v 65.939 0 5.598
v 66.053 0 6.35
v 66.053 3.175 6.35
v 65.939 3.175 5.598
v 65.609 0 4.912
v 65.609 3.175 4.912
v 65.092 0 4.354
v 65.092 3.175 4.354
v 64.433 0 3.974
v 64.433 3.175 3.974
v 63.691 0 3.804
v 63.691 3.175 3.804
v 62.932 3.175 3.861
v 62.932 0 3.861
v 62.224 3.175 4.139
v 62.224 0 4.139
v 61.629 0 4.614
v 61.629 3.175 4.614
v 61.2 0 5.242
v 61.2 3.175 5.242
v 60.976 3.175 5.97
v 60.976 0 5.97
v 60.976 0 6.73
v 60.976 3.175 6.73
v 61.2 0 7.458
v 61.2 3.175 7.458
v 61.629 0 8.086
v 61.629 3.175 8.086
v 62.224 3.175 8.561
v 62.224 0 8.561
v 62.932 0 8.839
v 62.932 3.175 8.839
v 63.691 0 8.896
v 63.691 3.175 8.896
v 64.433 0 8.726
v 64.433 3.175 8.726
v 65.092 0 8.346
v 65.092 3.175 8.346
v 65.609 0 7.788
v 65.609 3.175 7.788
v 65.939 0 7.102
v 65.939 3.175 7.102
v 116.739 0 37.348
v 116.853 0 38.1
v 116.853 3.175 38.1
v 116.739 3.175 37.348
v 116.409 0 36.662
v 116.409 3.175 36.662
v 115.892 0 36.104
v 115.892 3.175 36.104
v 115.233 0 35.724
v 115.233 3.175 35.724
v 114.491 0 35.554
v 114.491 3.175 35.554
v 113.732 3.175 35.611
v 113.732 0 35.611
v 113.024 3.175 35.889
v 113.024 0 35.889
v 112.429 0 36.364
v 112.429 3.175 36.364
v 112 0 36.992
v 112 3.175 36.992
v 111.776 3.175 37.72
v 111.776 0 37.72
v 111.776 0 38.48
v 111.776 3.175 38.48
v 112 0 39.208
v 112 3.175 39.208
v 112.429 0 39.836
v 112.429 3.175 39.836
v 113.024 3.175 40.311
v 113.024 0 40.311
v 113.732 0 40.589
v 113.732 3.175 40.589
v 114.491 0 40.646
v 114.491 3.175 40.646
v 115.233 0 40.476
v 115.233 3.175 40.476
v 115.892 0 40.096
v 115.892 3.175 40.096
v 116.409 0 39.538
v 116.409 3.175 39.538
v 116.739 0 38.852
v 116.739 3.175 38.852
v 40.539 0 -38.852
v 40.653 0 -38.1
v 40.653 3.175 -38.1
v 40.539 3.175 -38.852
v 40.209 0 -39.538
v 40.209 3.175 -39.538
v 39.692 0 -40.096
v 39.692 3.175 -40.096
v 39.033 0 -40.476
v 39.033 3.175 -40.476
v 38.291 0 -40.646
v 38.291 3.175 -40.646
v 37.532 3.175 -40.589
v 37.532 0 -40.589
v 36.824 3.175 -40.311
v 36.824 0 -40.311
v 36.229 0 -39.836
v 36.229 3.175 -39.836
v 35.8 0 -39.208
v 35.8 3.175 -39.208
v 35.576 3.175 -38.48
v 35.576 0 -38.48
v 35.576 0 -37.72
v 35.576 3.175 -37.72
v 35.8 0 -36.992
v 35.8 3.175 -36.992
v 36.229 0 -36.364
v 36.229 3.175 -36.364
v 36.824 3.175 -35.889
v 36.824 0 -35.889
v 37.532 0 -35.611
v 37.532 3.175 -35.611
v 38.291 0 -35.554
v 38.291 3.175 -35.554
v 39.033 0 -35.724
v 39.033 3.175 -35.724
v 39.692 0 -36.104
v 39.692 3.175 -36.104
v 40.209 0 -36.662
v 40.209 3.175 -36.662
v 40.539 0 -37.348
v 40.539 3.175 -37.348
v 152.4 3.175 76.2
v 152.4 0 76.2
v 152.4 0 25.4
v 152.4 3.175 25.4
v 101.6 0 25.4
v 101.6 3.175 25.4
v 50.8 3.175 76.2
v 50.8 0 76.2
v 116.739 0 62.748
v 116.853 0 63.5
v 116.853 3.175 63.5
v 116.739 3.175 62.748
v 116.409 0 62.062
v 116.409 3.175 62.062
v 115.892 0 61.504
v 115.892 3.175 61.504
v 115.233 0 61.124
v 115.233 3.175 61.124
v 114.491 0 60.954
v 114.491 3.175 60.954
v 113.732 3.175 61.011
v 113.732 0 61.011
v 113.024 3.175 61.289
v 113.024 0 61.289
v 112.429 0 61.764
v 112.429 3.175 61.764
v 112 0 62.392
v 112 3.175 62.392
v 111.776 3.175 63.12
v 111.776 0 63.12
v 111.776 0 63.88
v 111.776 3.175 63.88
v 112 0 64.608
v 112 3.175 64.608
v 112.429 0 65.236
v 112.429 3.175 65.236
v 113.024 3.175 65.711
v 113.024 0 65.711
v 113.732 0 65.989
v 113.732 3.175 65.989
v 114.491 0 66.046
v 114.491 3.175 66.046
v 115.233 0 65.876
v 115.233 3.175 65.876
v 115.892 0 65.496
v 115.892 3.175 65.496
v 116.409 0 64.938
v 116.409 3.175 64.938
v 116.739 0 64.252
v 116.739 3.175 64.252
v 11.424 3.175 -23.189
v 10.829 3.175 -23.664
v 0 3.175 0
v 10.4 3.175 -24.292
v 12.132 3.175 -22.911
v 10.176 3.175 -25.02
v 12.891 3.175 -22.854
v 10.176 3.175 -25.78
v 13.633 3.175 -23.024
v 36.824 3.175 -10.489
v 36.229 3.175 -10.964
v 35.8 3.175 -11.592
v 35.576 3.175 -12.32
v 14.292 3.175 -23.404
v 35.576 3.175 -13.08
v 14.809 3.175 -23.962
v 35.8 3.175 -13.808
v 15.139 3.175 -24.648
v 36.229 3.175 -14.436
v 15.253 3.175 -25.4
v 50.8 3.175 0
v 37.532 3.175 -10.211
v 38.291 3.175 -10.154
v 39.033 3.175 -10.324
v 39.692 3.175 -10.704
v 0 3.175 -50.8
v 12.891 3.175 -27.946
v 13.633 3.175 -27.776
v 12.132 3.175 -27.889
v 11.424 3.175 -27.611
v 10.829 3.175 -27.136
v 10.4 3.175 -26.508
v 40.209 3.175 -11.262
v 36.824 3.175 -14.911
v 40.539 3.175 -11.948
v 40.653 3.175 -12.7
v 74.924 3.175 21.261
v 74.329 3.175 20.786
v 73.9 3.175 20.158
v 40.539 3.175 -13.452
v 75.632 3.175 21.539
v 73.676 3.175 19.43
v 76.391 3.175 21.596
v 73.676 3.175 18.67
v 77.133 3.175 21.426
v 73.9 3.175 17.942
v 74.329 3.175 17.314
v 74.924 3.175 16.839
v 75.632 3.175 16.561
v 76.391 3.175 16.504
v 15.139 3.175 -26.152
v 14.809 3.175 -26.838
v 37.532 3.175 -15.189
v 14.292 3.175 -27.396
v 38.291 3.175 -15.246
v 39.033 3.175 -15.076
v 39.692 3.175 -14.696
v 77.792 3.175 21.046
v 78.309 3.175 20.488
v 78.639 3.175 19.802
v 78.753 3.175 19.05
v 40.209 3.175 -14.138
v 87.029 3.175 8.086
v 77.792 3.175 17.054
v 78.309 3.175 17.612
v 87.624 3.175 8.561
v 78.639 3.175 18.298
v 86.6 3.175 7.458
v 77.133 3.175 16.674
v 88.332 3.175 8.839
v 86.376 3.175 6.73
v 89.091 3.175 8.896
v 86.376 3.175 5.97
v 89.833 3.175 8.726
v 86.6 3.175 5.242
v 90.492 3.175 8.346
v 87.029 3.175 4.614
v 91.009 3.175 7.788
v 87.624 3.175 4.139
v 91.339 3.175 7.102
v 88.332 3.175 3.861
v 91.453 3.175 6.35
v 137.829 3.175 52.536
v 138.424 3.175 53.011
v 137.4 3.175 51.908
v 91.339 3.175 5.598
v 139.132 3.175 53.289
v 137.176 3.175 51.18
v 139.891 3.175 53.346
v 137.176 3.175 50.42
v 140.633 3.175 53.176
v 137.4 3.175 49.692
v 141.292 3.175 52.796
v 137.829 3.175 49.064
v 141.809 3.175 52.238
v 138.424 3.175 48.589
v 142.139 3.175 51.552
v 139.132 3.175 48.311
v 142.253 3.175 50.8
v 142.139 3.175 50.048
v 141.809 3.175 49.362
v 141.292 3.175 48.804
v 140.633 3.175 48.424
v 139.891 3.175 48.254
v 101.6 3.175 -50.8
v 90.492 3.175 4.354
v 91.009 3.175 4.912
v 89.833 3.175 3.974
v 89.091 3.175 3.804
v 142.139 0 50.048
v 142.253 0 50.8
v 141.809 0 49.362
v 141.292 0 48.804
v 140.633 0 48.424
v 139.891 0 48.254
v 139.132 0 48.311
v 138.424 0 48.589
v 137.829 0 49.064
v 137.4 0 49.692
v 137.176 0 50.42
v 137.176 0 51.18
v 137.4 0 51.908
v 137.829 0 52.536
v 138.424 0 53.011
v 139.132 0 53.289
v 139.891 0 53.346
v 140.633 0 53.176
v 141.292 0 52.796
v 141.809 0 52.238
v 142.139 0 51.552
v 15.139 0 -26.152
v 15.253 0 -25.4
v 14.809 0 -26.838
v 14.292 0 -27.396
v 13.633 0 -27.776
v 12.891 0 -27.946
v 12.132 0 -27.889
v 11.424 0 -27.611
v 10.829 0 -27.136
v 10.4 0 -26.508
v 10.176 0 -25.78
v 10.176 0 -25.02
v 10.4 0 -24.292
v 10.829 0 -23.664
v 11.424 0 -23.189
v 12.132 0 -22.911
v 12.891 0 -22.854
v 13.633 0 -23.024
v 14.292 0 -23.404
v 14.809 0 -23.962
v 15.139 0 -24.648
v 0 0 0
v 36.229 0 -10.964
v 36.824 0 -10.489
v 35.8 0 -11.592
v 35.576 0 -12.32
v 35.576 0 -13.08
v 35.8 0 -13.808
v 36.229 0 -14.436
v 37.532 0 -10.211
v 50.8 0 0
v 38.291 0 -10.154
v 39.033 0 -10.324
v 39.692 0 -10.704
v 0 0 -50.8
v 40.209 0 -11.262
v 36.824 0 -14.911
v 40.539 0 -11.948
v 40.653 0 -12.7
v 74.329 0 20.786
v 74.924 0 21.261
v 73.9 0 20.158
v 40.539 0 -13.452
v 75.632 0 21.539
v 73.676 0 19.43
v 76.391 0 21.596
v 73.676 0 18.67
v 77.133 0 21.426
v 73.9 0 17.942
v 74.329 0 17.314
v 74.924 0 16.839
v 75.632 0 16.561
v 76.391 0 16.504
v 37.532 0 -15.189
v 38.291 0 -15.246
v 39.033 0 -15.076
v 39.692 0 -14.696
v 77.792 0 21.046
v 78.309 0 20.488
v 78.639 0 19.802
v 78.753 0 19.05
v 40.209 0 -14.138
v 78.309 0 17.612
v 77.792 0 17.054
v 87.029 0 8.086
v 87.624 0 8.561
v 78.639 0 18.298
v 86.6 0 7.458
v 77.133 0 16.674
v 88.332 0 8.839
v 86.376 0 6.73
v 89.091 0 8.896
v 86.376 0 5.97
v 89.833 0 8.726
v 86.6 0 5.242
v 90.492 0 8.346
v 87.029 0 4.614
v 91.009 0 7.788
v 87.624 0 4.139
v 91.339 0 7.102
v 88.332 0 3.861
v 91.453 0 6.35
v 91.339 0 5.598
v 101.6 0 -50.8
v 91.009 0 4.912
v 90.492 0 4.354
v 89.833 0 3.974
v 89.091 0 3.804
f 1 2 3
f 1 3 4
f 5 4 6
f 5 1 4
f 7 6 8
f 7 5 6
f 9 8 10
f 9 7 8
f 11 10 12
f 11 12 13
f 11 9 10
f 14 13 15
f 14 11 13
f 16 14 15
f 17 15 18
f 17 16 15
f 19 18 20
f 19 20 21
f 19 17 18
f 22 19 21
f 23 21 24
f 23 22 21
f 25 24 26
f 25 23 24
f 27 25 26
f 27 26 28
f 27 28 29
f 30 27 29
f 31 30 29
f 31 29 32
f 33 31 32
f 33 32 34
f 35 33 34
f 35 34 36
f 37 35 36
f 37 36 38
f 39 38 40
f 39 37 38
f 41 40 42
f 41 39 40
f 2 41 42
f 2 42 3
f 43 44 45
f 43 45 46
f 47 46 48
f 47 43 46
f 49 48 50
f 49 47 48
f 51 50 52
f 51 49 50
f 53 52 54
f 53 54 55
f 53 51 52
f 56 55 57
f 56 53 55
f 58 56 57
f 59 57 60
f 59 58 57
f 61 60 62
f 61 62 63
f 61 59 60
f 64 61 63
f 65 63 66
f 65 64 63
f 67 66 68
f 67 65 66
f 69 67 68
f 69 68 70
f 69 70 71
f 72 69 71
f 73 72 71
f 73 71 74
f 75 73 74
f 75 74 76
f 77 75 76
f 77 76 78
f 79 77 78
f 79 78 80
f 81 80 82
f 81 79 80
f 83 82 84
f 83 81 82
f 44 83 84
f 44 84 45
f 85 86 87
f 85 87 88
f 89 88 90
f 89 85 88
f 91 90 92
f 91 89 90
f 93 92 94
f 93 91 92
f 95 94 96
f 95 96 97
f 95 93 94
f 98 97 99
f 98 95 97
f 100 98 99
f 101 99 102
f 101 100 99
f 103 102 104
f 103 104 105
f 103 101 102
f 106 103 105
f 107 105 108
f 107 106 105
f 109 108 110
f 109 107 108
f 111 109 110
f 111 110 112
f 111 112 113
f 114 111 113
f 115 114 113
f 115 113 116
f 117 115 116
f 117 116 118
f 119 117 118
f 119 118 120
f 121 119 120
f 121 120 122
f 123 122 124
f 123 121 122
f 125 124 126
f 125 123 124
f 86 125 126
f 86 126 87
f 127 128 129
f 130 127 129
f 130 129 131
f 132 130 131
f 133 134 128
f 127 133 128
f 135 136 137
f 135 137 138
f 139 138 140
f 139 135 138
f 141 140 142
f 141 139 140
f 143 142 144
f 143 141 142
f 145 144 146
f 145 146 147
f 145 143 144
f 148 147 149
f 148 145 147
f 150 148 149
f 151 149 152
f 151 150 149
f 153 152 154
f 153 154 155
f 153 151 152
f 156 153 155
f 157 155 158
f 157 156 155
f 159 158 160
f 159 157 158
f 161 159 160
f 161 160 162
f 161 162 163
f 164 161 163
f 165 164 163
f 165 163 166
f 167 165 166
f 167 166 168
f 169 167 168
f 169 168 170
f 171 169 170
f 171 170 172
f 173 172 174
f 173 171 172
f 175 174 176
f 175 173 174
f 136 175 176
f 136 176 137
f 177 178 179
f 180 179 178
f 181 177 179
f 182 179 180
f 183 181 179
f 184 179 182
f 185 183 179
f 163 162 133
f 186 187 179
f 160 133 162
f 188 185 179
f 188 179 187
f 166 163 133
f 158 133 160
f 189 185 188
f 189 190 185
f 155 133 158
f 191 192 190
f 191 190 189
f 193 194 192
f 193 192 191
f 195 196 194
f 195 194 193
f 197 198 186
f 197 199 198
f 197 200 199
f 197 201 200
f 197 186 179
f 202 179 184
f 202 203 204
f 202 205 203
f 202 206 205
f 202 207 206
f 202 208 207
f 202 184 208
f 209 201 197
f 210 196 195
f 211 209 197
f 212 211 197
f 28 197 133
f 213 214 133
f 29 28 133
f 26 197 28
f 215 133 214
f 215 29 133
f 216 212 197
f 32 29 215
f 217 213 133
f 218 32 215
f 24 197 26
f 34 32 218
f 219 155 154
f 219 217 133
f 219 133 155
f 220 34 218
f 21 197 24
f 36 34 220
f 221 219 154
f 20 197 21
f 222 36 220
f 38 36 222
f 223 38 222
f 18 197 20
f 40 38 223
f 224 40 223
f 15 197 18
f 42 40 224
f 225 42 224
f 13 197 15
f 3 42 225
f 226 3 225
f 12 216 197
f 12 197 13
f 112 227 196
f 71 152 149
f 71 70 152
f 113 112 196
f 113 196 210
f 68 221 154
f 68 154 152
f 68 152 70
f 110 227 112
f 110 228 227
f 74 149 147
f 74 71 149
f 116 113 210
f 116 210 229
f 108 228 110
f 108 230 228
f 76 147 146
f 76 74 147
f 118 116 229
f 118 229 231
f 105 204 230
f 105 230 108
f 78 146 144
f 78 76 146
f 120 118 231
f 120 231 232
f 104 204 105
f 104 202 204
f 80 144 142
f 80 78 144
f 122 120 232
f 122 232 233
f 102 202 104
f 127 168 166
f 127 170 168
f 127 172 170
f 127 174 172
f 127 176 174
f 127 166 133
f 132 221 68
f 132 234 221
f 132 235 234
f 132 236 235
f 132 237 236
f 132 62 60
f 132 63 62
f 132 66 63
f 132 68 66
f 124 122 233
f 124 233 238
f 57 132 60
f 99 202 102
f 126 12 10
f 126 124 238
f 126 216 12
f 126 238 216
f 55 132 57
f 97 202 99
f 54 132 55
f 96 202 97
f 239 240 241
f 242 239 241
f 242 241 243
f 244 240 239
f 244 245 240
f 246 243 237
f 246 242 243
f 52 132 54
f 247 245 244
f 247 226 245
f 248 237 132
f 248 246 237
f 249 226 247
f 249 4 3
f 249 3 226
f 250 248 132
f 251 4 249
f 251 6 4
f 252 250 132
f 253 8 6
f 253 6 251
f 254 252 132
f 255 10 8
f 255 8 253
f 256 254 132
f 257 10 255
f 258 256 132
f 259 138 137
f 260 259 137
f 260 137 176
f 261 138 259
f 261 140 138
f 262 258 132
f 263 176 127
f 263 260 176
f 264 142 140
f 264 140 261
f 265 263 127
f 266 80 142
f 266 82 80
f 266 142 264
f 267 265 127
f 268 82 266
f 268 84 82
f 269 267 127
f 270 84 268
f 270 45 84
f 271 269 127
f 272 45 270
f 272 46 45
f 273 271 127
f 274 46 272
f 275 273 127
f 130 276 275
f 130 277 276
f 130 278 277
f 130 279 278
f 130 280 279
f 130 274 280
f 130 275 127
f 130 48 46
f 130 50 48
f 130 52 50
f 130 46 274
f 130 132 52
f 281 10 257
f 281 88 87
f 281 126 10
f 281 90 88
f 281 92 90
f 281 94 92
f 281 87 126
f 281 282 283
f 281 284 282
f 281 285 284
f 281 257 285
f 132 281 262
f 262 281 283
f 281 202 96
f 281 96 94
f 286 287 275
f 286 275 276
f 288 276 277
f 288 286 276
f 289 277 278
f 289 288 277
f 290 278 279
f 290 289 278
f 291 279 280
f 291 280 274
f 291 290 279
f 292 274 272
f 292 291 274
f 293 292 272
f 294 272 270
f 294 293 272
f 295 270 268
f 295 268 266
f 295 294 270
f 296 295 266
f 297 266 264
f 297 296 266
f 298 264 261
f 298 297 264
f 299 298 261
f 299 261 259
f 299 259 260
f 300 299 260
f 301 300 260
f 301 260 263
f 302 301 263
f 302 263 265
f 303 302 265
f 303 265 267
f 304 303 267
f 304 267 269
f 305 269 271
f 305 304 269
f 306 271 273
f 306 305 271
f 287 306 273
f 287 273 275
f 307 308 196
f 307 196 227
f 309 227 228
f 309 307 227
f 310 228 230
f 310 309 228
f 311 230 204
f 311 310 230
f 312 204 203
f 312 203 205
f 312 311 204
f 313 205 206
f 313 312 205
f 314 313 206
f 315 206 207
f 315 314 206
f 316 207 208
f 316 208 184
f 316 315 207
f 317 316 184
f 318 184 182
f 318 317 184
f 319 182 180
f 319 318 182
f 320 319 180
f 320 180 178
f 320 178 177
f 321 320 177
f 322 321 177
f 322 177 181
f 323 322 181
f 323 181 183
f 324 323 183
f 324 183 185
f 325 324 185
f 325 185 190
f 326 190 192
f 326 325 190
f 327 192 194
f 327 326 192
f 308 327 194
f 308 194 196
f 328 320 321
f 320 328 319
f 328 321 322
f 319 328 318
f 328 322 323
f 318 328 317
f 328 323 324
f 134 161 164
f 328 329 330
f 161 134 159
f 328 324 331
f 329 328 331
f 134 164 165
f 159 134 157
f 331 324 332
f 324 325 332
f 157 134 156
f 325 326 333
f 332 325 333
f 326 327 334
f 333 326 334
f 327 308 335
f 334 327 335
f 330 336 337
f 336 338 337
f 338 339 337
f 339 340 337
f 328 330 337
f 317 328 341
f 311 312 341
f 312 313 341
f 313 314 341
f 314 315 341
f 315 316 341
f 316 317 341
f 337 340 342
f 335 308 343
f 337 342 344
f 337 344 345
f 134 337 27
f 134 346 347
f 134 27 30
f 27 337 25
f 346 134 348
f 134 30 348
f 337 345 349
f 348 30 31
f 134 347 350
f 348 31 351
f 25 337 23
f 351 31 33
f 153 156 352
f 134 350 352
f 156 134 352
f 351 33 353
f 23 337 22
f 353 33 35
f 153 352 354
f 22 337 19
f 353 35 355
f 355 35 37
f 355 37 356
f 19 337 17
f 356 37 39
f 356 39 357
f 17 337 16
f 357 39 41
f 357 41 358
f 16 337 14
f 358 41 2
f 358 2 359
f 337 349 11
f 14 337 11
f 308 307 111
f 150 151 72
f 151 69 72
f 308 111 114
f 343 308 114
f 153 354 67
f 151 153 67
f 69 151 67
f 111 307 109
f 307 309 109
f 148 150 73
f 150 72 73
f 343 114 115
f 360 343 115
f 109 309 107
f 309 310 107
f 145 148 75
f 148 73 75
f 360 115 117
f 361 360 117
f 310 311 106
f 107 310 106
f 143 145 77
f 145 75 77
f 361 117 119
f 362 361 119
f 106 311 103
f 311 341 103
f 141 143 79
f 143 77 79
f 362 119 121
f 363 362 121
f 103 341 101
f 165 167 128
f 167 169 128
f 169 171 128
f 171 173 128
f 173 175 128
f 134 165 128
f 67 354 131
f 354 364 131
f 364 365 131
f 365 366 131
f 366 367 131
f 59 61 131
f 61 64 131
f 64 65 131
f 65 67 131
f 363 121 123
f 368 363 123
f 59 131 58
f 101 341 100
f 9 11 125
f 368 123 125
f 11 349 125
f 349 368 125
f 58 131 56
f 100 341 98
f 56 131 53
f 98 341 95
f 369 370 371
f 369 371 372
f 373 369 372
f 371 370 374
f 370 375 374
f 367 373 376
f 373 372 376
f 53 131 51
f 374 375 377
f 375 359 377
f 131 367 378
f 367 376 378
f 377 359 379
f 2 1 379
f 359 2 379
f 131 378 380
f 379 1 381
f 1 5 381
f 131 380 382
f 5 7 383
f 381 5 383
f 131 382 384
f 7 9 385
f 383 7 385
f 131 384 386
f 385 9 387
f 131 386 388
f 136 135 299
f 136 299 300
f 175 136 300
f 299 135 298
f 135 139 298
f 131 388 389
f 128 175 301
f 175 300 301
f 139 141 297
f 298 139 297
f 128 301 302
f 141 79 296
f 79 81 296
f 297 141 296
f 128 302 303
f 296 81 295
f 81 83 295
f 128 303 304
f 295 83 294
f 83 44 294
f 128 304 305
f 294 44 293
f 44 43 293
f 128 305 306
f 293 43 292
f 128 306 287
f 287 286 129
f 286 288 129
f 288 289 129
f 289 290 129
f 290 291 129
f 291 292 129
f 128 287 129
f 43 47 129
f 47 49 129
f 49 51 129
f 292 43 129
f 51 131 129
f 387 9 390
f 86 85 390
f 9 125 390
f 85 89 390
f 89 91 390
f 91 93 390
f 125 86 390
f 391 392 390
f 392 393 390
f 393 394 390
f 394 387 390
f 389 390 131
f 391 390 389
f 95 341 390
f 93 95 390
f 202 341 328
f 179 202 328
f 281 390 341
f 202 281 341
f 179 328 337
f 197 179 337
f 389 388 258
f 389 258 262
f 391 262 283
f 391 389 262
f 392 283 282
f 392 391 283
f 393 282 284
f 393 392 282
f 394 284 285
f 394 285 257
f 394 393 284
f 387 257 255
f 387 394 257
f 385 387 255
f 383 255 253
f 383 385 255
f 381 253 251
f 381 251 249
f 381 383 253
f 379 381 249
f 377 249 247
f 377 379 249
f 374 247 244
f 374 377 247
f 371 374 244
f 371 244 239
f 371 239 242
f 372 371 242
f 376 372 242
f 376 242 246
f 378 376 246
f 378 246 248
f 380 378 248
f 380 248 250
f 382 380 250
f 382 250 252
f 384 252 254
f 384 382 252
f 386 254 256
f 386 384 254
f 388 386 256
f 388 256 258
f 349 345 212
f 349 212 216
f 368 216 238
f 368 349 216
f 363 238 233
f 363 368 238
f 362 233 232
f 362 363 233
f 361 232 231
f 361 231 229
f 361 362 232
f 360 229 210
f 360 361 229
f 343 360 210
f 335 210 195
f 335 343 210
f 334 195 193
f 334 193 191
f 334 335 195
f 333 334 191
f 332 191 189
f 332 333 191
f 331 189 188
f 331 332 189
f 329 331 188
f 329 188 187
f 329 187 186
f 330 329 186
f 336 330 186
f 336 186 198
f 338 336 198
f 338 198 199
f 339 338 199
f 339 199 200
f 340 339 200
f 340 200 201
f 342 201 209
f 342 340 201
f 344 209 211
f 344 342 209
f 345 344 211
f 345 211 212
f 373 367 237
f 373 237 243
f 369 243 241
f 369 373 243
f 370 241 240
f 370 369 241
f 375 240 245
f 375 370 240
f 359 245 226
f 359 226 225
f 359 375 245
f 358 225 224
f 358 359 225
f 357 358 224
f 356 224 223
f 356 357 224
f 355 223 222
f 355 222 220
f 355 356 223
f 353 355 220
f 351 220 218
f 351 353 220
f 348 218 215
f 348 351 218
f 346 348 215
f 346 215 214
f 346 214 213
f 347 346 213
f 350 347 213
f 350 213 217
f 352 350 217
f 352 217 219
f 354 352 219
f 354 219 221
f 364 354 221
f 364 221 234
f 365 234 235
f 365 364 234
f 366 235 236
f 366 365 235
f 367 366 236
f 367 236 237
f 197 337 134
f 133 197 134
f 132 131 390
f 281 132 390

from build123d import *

# Parameters (mm, degrees)
SKETCH1_R           = 2.5527
BOSS_EXTRUDE1_DEPTH = 3.175


with BuildPart() as part:
    # Sketch1 → Boss-Extrude1 (new body)
    with BuildSketch(Plane(origin=(0, 0, 0), x_dir=(1, 0, 0), z_dir=(0, 1, 0))):
        Polygon((0, 0), (50.8, 0), (50.8, -76.2), (101.6, -76.2), (152.4, -76.2), (152.4, -25.4), (101.6, -25.4), (101.6, 50.8), (0, 50.8), align=None)
        with Locations((12.7, 25.4)):
            Circle(SKETCH1_R, mode=Mode.SUBTRACT)
        with Locations((38.1, 12.7)):
            Circle(SKETCH1_R, mode=Mode.SUBTRACT)
        with Locations((38.1, 38.1)):
            Circle(SKETCH1_R, mode=Mode.SUBTRACT)
        with Locations((139.7, -50.8)):
            Circle(SKETCH1_R, mode=Mode.SUBTRACT)
        with Locations((114.3, -38.1)):
            Circle(SKETCH1_R, mode=Mode.SUBTRACT)
        with Locations((114.3, -63.5)):
            Circle(SKETCH1_R, mode=Mode.SUBTRACT)
        with Locations((63.5, -6.35)):
            Circle(SKETCH1_R, mode=Mode.SUBTRACT)
        with Locations((88.9, -6.35)):
            Circle(SKETCH1_R, mode=Mode.SUBTRACT)
        with Locations((76.2, -19.05)):
            Circle(SKETCH1_R, mode=Mode.SUBTRACT)
    extrude(amount=BOSS_EXTRUDE1_DEPTH)


solid = part.part
